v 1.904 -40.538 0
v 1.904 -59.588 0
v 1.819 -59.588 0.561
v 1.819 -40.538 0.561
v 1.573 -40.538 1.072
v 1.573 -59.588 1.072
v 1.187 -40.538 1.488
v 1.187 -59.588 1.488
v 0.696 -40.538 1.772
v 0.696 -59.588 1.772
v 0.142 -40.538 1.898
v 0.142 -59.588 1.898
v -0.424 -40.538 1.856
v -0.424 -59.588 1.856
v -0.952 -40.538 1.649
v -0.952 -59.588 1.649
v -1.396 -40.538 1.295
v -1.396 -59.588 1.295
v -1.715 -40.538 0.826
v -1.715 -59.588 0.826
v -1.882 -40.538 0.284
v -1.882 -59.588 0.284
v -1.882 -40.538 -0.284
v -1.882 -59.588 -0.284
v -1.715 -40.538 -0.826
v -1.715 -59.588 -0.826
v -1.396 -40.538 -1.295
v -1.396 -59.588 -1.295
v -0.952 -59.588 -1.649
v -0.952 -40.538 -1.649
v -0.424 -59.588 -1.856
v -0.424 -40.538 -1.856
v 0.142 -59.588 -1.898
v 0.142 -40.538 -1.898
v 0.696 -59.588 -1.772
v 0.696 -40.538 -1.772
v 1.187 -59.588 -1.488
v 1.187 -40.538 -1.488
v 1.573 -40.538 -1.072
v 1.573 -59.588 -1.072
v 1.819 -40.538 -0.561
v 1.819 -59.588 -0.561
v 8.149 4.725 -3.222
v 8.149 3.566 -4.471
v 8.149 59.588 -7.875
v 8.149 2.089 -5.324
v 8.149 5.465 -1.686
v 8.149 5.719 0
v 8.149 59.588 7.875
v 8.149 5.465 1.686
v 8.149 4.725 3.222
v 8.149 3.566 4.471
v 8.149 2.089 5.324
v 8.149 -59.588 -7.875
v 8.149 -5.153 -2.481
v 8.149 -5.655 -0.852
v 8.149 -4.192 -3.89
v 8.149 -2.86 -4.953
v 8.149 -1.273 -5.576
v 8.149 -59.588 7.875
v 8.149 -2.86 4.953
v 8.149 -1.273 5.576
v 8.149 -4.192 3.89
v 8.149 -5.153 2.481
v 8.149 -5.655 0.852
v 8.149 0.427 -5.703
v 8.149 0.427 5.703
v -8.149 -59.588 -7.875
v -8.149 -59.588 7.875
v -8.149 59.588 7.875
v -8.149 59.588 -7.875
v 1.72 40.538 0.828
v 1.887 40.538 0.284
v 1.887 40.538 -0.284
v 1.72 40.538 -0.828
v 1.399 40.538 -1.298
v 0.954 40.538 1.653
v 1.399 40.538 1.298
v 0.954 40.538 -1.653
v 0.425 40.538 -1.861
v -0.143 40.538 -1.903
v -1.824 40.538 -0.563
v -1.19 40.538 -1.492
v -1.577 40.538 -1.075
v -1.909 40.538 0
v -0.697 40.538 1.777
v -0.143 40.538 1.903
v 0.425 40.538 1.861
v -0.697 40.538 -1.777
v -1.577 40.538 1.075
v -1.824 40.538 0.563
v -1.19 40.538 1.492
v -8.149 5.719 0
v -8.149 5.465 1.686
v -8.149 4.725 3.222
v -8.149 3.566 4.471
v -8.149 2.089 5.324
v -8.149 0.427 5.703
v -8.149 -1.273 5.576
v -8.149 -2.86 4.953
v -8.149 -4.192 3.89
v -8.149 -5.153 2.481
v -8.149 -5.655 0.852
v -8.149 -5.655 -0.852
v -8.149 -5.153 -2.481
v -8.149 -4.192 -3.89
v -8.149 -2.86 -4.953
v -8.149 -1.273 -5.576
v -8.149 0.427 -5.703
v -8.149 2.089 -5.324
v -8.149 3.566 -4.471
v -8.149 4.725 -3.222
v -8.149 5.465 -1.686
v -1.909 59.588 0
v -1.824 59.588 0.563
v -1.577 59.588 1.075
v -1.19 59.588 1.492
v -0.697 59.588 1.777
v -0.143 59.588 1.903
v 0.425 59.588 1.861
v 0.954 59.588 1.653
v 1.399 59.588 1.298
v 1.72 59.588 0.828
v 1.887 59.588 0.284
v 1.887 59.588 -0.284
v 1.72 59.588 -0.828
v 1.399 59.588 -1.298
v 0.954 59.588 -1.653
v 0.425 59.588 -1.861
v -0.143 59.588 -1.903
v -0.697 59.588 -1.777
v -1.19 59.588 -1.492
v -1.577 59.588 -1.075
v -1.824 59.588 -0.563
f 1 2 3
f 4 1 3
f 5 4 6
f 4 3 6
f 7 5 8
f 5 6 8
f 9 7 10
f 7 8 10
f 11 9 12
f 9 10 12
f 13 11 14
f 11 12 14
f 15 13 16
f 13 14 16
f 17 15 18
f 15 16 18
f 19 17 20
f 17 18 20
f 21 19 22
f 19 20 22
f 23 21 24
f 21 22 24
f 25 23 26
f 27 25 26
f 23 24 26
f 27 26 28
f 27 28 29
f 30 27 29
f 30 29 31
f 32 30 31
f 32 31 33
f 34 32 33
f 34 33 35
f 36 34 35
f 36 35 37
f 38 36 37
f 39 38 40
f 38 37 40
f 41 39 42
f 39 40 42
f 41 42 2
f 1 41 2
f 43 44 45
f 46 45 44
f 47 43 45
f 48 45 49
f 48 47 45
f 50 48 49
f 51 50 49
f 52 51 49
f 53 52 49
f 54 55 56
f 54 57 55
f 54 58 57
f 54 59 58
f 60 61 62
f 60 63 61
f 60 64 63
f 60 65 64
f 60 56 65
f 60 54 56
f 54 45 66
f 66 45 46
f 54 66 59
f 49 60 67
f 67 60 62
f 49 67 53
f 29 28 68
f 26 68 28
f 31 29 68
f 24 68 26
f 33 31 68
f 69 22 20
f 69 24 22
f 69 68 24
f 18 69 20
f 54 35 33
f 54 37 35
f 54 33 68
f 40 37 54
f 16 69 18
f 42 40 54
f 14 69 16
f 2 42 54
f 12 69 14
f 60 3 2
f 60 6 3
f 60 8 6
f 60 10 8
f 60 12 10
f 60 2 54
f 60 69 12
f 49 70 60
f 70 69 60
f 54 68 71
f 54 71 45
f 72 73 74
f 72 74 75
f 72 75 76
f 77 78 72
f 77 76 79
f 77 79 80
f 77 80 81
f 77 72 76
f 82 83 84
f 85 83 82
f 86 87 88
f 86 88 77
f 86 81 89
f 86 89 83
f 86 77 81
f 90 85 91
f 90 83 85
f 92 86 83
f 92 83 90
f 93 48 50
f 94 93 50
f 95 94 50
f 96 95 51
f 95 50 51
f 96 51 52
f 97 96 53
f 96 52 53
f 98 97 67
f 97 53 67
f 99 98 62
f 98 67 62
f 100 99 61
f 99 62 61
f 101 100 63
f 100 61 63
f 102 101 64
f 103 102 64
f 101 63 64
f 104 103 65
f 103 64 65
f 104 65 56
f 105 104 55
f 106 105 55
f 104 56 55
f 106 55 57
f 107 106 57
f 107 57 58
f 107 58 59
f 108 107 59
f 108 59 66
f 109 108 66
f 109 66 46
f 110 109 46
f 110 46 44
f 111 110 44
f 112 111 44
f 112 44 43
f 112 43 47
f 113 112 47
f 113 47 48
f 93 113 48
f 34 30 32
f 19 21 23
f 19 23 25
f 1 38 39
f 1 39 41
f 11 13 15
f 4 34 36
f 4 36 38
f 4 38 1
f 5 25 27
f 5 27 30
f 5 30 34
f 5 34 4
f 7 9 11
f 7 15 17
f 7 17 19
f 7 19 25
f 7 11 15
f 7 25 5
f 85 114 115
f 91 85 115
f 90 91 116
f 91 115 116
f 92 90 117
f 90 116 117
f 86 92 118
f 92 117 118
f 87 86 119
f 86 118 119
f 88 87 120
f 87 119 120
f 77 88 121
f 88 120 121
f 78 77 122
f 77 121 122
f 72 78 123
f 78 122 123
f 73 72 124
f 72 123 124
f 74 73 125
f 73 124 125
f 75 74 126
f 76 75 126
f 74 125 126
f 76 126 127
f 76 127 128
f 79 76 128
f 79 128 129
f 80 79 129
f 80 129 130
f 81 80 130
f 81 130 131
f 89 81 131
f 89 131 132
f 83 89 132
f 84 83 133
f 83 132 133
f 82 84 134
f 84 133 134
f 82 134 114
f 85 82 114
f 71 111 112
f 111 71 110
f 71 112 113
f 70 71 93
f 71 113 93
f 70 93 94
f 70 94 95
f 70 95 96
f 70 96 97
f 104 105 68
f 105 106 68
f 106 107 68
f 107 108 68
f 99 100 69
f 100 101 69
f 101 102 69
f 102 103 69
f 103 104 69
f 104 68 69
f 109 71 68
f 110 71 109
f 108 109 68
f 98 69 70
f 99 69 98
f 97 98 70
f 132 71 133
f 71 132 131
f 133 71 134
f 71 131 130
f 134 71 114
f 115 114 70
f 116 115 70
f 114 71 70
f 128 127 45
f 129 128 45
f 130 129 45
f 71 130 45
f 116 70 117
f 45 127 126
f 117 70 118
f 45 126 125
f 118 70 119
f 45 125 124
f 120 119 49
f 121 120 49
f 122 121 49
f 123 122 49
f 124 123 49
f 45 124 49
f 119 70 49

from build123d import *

# Parameters (mm, degrees)
F0_W          = 16.298802
F0_H          = 15.749276
F1_DEPTH      = 59.5884
F1_DEPTH_BACK = 59.5884
F2_R          = 5.719222
F3_DEPTH      = 18.542
F4_R          = 1.903741
F5_DEPTH      = 19.05
F6_R          = 1.908705
F7_DEPTH      = 19.05


with BuildPart() as f1:
    # F0 (on Front) → F1 (new body, two sides)
    with BuildSketch(Plane.XZ) as f1_sk:
        Rectangle(F0_W, F0_H)
    extrude(amount=F1_DEPTH)
    extrude(f1_sk.sketch, amount=-F1_DEPTH_BACK)

    # F2 (on face) → F3 (cut)
    with BuildSketch(Plane.YZ.offset(8.149401)):
        Circle(F2_R)
    extrude(amount=-F3_DEPTH, mode=Mode.SUBTRACT)

    # F4 (on face) → F5 (cut)
    with BuildSketch(Plane.XZ.offset(59.5884)):
        Circle(F4_R)
    extrude(amount=-F5_DEPTH, mode=Mode.SUBTRACT)

    # F6 (on face) → F7 (cut)
    with BuildSketch(Plane(origin=(0, 59.5884, 0), x_dir=(-1, 0, 0), z_dir=(0, 1, 0))):
        Circle(F6_R)
    extrude(amount=-F7_DEPTH, mode=Mode.SUBTRACT)


solid = f1.part
